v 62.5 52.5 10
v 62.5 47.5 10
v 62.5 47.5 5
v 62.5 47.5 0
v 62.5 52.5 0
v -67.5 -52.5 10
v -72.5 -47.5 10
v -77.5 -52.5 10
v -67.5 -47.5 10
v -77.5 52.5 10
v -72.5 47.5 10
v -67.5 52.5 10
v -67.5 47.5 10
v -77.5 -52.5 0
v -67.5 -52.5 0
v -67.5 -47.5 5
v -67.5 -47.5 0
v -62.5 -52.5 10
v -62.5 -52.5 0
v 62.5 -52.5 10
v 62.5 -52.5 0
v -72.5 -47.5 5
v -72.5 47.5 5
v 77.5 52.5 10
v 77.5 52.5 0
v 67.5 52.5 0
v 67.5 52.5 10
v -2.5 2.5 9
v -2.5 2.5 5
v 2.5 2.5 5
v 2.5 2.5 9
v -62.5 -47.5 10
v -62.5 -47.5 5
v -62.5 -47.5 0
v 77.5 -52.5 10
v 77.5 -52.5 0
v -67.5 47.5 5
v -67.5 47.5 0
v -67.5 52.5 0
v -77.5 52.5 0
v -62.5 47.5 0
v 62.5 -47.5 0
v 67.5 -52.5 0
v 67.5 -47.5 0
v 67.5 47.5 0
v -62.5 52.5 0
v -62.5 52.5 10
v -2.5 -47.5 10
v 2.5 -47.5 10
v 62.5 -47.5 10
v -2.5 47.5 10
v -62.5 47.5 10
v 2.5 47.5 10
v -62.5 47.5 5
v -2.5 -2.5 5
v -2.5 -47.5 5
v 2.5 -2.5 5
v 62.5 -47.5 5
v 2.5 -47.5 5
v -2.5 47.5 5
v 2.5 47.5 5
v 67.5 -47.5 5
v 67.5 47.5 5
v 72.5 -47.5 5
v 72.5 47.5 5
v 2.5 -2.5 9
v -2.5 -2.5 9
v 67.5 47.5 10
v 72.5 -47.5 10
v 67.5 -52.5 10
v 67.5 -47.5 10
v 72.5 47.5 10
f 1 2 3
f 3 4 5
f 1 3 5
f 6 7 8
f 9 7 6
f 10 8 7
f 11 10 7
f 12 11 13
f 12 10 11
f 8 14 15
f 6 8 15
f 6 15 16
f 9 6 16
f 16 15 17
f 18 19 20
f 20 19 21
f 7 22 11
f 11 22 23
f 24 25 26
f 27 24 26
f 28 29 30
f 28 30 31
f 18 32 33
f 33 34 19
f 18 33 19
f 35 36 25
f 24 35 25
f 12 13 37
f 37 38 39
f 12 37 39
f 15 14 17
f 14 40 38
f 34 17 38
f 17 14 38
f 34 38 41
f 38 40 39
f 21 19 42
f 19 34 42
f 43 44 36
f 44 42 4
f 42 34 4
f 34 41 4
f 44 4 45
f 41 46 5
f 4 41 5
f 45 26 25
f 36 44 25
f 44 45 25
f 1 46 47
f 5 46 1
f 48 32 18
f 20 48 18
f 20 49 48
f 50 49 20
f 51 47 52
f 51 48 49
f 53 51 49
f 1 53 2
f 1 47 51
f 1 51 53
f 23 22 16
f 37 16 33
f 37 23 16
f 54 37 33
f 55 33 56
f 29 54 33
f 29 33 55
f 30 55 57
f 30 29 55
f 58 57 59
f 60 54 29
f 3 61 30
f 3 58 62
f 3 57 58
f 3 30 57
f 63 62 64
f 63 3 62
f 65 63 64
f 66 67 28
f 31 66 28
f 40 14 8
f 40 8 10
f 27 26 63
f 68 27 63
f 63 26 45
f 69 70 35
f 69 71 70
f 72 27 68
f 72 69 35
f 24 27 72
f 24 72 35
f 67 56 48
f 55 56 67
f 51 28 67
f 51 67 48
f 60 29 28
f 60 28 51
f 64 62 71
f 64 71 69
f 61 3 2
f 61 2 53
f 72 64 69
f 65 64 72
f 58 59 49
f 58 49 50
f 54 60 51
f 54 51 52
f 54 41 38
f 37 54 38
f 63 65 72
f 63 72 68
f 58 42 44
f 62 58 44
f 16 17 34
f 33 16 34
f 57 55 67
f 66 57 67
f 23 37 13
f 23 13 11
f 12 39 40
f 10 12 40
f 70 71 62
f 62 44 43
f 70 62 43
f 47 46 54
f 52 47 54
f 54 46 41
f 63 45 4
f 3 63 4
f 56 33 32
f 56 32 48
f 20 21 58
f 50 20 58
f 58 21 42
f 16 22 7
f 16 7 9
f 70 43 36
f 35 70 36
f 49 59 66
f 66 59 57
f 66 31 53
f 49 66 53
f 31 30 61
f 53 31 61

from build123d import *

# Parameters (mm, degrees)
F0_W     = 75
F0_H     = 105
F0_W_2   = 5
F1_DEPTH = 10
F2_T     = -5
F4_DEPTH = 25
F5_DEPTH = 10
F6_W     = 2.5
F6_H     = 4
F7_DEPTH = 25


with BuildPart() as f1:
    # F0 (on Top) → F1 (new body)
    with BuildSketch(Plane.XY):
        with Locations((40, 0)):
            Rectangle(F0_W, F0_H)
        with Locations((-40, 0)):
            Rectangle(F0_W, F0_H)
        Rectangle(F0_W_2, F0_H)
    extrude(amount=F1_DEPTH)

    # F2
    f2_openings = [f1.faces().sort_by_distance(p)[0] for p in [
        (0, 0, 10),
    ]]
    offset(amount=F2_T, openings=f2_openings)

    # F3 (on Top) → F4 (intersect)
    with BuildSketch(Plane.XY):
        Polygon((-67.5, 52.5), (-77.5, 52.5), (-77.5, -52.5), (-67.5, -52.5), (-67.5, -47.5), (-62.5, -47.5), (-62.5, -52.5), (62.5, -52.5), (62.5, -47.5), (67.5, -47.5), (67.5, -52.5), (77.5, -52.5), (77.5, 52.5), (67.5, 52.5), (67.5, 47.5), (62.5, 47.5), (62.5, 52.5), (-62.5, 52.5), (-62.5, 47.5), (-67.5, 47.5), align=None)
    extrude(amount=F4_DEPTH, mode=Mode.INTERSECT)

    # F0 (on Top) → F5 (join)
    with BuildSketch(Plane.XY):
        Rectangle(F0_W_2, F0_H)
    extrude(amount=F5_DEPTH)

    # F6 (on face) → F7 (cut)
    with BuildSketch(Plane(origin=(-2.5, 0, 0), x_dir=(0, -1, 0), z_dir=(-1, 0, 0))):
        with Locations((-1.25, 7)):
            Rectangle(F6_W, F6_H)
        with Locations((1.25, 7)):
            Rectangle(F6_W, F6_H)
    extrude(amount=-F7_DEPTH, mode=Mode.SUBTRACT)


solid = f1.part
